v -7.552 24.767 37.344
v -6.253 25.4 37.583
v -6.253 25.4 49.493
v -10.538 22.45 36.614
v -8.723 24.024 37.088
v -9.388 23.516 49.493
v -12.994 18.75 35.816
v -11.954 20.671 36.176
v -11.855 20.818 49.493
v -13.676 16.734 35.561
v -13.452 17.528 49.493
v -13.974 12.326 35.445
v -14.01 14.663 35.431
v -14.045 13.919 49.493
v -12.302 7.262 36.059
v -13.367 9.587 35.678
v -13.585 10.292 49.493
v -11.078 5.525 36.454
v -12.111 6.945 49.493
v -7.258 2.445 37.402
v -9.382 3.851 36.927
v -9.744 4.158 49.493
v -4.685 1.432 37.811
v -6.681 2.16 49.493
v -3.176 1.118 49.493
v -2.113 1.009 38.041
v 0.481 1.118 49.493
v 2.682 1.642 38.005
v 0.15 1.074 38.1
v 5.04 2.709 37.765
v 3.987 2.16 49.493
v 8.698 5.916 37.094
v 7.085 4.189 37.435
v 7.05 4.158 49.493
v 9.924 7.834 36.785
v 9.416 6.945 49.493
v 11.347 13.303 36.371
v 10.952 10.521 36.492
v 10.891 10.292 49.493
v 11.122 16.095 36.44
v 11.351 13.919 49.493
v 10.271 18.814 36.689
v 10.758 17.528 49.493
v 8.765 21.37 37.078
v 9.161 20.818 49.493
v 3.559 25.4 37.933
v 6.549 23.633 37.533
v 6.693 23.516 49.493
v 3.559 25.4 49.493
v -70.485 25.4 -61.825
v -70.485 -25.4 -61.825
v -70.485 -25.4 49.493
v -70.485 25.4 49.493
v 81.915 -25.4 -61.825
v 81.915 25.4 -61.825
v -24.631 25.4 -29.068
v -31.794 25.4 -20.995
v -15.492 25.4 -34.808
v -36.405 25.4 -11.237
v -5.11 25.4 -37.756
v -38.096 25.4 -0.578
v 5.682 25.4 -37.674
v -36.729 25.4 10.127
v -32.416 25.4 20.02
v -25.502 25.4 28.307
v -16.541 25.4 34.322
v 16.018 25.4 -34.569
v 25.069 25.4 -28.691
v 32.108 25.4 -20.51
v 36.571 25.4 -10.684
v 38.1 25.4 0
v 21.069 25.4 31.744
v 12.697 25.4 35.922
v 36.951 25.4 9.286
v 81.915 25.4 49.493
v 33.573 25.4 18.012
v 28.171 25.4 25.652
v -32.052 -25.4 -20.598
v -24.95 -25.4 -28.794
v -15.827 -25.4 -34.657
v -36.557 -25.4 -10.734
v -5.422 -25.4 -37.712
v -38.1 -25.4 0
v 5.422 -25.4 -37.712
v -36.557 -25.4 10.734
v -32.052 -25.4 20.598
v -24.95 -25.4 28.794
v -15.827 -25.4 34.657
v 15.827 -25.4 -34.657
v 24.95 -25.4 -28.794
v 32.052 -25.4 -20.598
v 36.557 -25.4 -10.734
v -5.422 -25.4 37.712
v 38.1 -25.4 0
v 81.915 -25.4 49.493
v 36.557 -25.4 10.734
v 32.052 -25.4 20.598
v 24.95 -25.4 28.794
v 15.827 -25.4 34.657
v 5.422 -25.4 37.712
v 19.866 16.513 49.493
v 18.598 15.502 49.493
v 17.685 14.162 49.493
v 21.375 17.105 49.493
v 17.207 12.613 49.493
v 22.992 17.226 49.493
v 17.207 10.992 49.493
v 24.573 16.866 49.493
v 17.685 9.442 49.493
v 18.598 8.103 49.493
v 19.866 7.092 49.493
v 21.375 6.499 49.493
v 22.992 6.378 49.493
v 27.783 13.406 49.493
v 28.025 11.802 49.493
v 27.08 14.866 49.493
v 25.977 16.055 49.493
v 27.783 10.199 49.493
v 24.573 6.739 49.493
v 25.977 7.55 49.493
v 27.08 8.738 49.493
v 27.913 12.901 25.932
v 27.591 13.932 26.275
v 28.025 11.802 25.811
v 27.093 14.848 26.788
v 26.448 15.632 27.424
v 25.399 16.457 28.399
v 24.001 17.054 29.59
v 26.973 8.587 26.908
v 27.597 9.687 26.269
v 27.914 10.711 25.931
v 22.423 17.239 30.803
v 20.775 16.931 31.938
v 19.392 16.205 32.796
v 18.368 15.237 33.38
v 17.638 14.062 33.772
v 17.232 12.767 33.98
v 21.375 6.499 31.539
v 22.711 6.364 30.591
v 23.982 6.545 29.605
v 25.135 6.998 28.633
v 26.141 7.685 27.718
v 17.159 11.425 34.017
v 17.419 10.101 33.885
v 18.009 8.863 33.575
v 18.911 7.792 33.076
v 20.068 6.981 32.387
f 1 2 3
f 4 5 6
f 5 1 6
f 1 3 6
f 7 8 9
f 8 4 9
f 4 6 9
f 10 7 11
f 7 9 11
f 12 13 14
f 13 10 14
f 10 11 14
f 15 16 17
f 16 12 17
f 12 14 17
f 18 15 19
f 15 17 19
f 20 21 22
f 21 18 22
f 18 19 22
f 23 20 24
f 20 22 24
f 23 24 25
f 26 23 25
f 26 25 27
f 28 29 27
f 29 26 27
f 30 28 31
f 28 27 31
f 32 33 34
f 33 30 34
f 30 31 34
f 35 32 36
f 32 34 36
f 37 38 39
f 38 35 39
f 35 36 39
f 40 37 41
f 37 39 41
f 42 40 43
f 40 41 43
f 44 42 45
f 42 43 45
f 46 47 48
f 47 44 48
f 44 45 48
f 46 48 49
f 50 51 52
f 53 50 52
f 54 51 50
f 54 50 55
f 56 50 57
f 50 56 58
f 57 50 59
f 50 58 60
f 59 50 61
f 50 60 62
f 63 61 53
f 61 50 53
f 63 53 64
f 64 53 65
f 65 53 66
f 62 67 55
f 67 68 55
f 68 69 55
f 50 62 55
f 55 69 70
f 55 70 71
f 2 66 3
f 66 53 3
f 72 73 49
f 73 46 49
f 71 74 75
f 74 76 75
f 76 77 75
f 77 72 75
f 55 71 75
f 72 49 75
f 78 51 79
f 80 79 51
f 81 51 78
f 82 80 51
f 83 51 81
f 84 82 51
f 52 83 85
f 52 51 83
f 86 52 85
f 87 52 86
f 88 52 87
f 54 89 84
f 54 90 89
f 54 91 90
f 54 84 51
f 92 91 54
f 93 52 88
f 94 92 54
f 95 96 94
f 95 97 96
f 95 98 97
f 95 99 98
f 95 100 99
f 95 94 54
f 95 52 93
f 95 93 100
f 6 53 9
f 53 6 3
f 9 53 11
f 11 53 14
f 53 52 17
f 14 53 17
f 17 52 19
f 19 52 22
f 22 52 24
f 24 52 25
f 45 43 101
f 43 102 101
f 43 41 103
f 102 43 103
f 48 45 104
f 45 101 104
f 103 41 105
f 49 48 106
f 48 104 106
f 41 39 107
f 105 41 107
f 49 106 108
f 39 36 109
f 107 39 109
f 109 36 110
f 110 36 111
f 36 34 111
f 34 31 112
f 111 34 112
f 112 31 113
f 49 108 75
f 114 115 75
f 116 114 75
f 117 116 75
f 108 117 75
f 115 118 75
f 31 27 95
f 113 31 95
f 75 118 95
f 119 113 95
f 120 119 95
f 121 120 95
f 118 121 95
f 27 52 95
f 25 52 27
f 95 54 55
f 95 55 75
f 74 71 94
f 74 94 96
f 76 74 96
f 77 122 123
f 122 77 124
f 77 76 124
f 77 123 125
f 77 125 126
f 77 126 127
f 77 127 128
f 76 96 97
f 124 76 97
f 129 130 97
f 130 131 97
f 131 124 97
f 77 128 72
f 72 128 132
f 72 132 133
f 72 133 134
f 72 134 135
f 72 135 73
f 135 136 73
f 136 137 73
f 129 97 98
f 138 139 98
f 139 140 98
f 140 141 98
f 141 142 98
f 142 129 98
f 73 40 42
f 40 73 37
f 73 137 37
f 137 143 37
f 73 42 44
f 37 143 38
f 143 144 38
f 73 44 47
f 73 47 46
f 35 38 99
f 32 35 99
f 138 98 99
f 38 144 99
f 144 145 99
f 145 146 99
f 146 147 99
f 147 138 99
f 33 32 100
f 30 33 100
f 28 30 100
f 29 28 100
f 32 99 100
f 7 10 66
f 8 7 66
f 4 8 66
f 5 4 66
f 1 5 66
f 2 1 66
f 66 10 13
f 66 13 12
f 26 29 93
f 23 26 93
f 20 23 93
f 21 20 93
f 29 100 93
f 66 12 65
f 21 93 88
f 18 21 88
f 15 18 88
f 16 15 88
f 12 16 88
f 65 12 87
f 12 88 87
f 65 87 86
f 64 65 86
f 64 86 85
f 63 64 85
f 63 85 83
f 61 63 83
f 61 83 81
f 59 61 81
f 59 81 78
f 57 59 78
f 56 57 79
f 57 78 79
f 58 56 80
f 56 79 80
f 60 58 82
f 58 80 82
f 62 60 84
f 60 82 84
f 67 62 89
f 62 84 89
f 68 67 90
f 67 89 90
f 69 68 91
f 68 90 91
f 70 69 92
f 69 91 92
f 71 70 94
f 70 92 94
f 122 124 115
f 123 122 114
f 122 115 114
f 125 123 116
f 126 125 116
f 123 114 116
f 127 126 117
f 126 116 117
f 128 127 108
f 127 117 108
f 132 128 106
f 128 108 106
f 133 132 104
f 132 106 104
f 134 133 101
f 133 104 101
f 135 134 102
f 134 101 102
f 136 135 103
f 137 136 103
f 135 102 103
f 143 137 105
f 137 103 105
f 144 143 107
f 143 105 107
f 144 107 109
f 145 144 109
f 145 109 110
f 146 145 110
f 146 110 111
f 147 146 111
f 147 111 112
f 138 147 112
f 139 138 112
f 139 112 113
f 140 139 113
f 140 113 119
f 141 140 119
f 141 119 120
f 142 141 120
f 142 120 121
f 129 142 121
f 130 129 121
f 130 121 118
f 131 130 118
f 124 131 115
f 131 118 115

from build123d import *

# Parameters (mm, degrees)
F0_W          = 152.4
F0_H          = 111.3182650085
F1_DEPTH      = 25.4
F1_DEPTH_BACK = 25.4
F2_R          = 38.1
F3_DEPTH      = 50.801
F4_R          = 12.7
F4_R_2        = 5.4393571469
F5_DEPTH      = 25.4


with BuildPart() as f1:
    # F0 (on Front) → F1 (new body, two sides)
    with BuildSketch(Plane.XZ) as f1_sk:
        with Locations((5.7149976492, -6.166184321)):
            Rectangle(F0_W, F0_H)
    extrude(amount=F1_DEPTH)
    extrude(f1_sk.sketch, amount=-F1_DEPTH_BACK)

    # F2 (on face) → F3 (cut, through all)
    with BuildSketch(Plane.XZ.offset(25.4)):
        Circle(F2_R)
    extrude(amount=-F3_DEPTH, mode=Mode.SUBTRACT)

    # F4 (on face) → F5 (cut)
    with BuildSketch(Plane.XY.offset(49.4929481832)):
        with Locations((-1.347124782, 13.6859212071)):
            Circle(F4_R)
        with Locations((22.58563655, 11.8023242822)):
            Circle(F4_R_2)
    extrude(amount=-F5_DEPTH, mode=Mode.SUBTRACT)


solid = f1.part
